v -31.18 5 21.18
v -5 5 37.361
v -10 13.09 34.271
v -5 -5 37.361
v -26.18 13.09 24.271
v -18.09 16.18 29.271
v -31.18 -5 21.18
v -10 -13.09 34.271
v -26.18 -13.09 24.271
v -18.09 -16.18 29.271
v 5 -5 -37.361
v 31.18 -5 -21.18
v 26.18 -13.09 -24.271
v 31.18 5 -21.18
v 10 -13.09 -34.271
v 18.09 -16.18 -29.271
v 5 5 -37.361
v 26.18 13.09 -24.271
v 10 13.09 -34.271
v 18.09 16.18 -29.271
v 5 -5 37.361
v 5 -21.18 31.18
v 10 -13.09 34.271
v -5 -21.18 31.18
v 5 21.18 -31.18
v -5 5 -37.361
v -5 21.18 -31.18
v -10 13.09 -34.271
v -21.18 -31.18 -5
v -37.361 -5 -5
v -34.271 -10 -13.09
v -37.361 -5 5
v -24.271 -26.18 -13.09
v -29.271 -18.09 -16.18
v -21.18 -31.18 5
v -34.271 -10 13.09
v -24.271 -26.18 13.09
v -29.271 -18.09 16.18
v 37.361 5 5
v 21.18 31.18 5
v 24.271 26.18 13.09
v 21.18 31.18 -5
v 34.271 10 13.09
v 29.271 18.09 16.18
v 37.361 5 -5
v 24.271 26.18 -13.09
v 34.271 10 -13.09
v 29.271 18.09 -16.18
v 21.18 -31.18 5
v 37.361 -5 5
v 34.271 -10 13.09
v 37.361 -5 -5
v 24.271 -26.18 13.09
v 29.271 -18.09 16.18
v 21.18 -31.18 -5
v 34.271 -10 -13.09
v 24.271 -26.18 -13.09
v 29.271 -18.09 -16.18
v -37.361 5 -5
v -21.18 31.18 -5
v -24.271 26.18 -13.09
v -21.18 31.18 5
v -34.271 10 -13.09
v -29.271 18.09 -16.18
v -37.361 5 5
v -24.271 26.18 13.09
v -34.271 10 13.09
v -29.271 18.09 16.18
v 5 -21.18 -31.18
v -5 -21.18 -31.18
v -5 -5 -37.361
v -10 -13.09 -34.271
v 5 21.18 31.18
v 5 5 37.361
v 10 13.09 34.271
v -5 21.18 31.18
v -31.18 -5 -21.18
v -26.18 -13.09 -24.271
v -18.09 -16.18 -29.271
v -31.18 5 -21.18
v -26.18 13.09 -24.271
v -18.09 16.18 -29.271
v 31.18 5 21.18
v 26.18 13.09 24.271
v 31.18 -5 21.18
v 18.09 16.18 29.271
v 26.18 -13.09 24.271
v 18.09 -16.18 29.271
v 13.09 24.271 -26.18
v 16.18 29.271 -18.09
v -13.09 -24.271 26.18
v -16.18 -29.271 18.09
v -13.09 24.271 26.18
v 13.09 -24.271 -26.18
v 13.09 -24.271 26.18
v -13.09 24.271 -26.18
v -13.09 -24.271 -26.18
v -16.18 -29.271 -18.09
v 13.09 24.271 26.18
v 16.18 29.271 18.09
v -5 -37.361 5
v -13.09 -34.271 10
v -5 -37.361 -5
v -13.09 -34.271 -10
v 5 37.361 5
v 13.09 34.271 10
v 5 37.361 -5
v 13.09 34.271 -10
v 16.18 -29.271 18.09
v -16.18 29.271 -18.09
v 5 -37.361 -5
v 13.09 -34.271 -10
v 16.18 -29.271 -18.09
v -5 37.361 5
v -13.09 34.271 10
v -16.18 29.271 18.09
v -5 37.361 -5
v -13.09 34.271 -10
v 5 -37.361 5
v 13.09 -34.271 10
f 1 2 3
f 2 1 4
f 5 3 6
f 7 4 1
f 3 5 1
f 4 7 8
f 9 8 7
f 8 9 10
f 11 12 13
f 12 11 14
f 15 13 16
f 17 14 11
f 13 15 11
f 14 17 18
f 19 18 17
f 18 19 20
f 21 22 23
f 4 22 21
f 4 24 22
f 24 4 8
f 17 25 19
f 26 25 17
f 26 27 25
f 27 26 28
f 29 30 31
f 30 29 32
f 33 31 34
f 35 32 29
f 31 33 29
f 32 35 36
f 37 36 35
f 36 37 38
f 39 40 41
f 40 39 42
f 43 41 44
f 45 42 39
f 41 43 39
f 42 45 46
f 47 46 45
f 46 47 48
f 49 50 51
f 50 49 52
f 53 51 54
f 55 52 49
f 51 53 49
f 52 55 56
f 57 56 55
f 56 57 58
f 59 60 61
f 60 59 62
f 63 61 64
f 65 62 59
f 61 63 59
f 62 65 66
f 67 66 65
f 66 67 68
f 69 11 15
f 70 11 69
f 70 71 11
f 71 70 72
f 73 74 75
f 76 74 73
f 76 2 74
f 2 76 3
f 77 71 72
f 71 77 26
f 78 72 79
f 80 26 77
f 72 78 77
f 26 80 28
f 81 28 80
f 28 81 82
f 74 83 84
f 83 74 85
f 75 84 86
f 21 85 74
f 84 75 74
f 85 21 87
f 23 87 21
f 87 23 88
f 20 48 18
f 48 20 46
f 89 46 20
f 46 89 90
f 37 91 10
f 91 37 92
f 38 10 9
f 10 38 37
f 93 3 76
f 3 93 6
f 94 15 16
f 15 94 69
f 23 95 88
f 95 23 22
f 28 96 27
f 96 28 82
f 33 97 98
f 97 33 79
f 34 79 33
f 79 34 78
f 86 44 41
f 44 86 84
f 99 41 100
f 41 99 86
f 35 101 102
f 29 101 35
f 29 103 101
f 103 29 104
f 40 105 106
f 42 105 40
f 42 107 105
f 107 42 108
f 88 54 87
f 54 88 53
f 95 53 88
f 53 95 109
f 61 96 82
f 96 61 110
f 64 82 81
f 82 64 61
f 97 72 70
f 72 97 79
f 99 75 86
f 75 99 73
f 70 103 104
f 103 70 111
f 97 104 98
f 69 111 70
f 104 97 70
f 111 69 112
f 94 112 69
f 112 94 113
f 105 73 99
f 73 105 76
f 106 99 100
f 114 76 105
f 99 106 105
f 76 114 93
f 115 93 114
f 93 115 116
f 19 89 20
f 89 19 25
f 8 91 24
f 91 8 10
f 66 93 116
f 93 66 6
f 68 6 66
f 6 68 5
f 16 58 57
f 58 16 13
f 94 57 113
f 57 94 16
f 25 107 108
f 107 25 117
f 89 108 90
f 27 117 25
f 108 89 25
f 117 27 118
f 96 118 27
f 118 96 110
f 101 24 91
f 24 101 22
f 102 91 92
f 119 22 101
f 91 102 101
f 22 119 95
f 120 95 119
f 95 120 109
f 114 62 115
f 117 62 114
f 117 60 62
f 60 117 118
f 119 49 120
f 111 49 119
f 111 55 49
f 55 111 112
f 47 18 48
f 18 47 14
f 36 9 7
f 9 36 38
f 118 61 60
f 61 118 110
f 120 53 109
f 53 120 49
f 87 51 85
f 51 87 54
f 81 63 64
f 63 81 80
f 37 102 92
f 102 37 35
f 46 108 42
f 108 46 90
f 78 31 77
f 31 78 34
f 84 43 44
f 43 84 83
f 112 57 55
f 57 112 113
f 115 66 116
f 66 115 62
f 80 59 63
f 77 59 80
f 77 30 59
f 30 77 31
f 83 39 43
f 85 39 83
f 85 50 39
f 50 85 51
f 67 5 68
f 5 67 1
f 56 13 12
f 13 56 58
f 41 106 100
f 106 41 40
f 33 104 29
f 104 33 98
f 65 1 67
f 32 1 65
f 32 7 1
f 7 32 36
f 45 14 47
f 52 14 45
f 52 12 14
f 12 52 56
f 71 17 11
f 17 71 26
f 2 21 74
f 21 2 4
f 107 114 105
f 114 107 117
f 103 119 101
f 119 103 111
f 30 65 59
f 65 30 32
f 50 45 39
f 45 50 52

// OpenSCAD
// test polyhedrons where the facets are not, stritcly speaking, planar,
// but instead "near planar". see issue #349 in github.
polyhedron(points = [[-10., -13.090169943749475, -34.270509831248425], 
[-10., -13.090169943749475, 34.270509831248425], 
[-10., 13.090169943749475, -34.270509831248425], 
[-10., 13.090169943749475, 34.270509831248425], 
[-5., -5., -37.3606797749979], [-5., -5., 37.3606797749979], 
[-5., 5., -37.3606797749979], [-5., 5., 37.3606797749979], 
[-5., -37.3606797749979, -5.], [-5., -37.3606797749979, 5.], 
[-5., -21.18033988749895, -31.18033988749895], 
[-5., -21.18033988749895, 31.18033988749895], [-5., 37.3606797749979, -5.], 
[-5., 37.3606797749979, 5.], [-5., 21.18033988749895, -31.18033988749895], 
[-5., 21.18033988749895, 31.18033988749895], [5., -5., -37.3606797749979], 
[5., -5., 37.3606797749979], [5., 5., -37.3606797749979], 
[5., 5., 37.3606797749979], [5., -37.3606797749979, -5.], 
[5., -37.3606797749979, 5.], [5., -21.18033988749895, -31.18033988749895], 
[5., -21.18033988749895, 31.18033988749895], [5., 37.3606797749979, -5.], 
[5., 37.3606797749979, 5.], [5., 21.18033988749895, -31.18033988749895], 
[5., 21.18033988749895, 31.18033988749895], [10., -13.090169943749475, 
 -34.270509831248425], [10., -13.090169943749475, 34.270509831248425], 
[10., 13.090169943749475, -34.270509831248425], 
[10., 13.090169943749475, 34.270509831248425], 
[-34.270509831248425, -10., -13.090169943749475], 
[-34.270509831248425, -10., 13.090169943749475], 
[-34.270509831248425, 10., -13.090169943749475], 
[-34.270509831248425, 10., 13.090169943749475], 
[-29.270509831248425, -18.090169943749473, -16.18033988749895], 
[-29.270509831248425, -18.090169943749473, 16.18033988749895], 
[-29.270509831248425, 18.090169943749473, -16.18033988749895], 
[-29.270509831248425, 18.090169943749473, 16.18033988749895], 
[-18.090169943749473, -16.18033988749895, -29.270509831248425], 
[-18.090169943749473, -16.18033988749895, 29.270509831248425], 
[-18.090169943749473, 16.18033988749895, -29.270509831248425], 
[-18.090169943749473, 16.18033988749895, 29.270509831248425], 
[-13.090169943749475, -34.270509831248425, -10.], 
[-13.090169943749475, -34.270509831248425, 10.], 
[-13.090169943749475, -24.270509831248425, -26.18033988749895], 
[-13.090169943749475, -24.270509831248425, 26.18033988749895], 
[-13.090169943749475, 24.270509831248425, -26.18033988749895], 
[-13.090169943749475, 24.270509831248425, 26.18033988749895], 
[-13.090169943749475, 34.270509831248425, -10.], 
[-13.090169943749475, 34.270509831248425, 10.], 
[-26.18033988749895, -13.090169943749475, -24.270509831248425], 
[-26.18033988749895, -13.090169943749475, 24.270509831248425], 
[-26.18033988749895, 13.090169943749475, -24.270509831248425], 
[-26.18033988749895, 13.090169943749475, 24.270509831248425], 
[-37.3606797749979, -5., -5.], [-37.3606797749979, -5., 5.], 
[-37.3606797749979, 5., -5.], [-37.3606797749979, 5., 5.], 
[-16.18033988749895, -29.270509831248425, -18.090169943749473], 
[-16.18033988749895, -29.270509831248425, 18.090169943749473], 
[-16.18033988749895, 29.270509831248425, -18.090169943749473], 
[-16.18033988749895, 29.270509831248425, 18.090169943749473], 
[-31.18033988749895, -5., -21.18033988749895], 
[-31.18033988749895, -5., 21.18033988749895], 
[-31.18033988749895, 5., -21.18033988749895], 
[-31.18033988749895, 5., 21.18033988749895], 
[-21.18033988749895, -31.18033988749895, -5.], 
[-21.18033988749895, -31.18033988749895, 5.], 
[-21.18033988749895, 31.18033988749895, -5.], 
[-21.18033988749895, 31.18033988749895, 5.], 
[-24.270509831248425, -26.18033988749895, -13.090169943749475], 
[-24.270509831248425, -26.18033988749895, 13.090169943749475], 
[-24.270509831248425, 26.18033988749895, -13.090169943749475], 
[-24.270509831248425, 26.18033988749895, 13.090169943749475], 
[16.18033988749895, -29.270509831248425, -18.090169943749473], 
[16.18033988749895, -29.270509831248425, 18.090169943749473], 
[16.18033988749895, 29.270509831248425, -18.090169943749473], 
[16.18033988749895, 29.270509831248425, 18.090169943749473], 
[24.270509831248425, -26.18033988749895, -13.090169943749475], 
[24.270509831248425, -26.18033988749895, 13.090169943749475], 
[24.270509831248425, 26.18033988749895, -13.090169943749475], 
[24.270509831248425, 26.18033988749895, 13.090169943749475], 
[37.3606797749979, -5., -5.], [37.3606797749979, -5., 5.], 
[37.3606797749979, 5., -5.], [37.3606797749979, 5., 5.], 
[21.18033988749895, -31.18033988749895, -5.], 
[21.18033988749895, -31.18033988749895, 5.], 
[21.18033988749895, 31.18033988749895, -5.], 
[21.18033988749895, 31.18033988749895, 5.], 
[13.090169943749475, -34.270509831248425, -10.], 
[13.090169943749475, -34.270509831248425, 10.], 
[13.090169943749475, -24.270509831248425, -26.18033988749895], 
[13.090169943749475, -24.270509831248425, 26.18033988749895], 
[13.090169943749475, 24.270509831248425, -26.18033988749895], 
[13.090169943749475, 24.270509831248425, 26.18033988749895], 
[13.090169943749475, 34.270509831248425, -10.], 
[13.090169943749475, 34.270509831248425, 10.], 
[26.18033988749895, -13.090169943749475, -24.270509831248425], 
[26.18033988749895, -13.090169943749475, 24.270509831248425], 
[26.18033988749895, 13.090169943749475, -24.270509831248425], 
[26.18033988749895, 13.090169943749475, 24.270509831248425], 
[31.18033988749895, -5., -21.18033988749895], 
[31.18033988749895, -5., 21.18033988749895], 
[31.18033988749895, 5., -21.18033988749895], 
[31.18033988749895, 5., 21.18033988749895], 
[18.090169943749473, -16.18033988749895, -29.270509831248425], 
[18.090169943749473, -16.18033988749895, 29.270509831248425], 
[18.090169943749473, 16.18033988749895, -29.270509831248425], 
[18.090169943749473, 16.18033988749895, 29.270509831248425], 
[29.270509831248425, -18.090169943749473, -16.18033988749895], 
[29.270509831248425, -18.090169943749473, 16.18033988749895], 
[29.270509831248425, 18.090169943749473, -16.18033988749895], 
[29.270509831248425, 18.090169943749473, 16.18033988749895], 
[34.270509831248425, -10., -13.090169943749475], 
[34.270509831248425, -10., 13.090169943749475], 
[34.270509831248425, 10., -13.090169943749475], 
[34.270509831248425, 10., 13.090169943749475]],faces = 
[[41, 53, 65, 67, 55, 43, 3, 7, 5, 1], [100, 104, 106, 102, 110, 30, 18, 16, 
 28, 108], [11, 1, 5, 17, 29, 23], [18, 30, 26, 14, 2, 6], 
[33, 37, 73, 69, 68, 72, 36, 32, 56, 57], [91, 90, 82, 114, 118, 86, 87, 
 119, 115, 83], [81, 113, 117, 85, 84, 116, 112, 80, 88, 89], 
[59, 58, 34, 38, 74, 70, 71, 75, 39, 35], [0, 10, 22, 28, 16, 4], 
[15, 27, 31, 19, 7, 3], [64, 52, 40, 0, 4, 6, 2, 42, 54, 66], 
[19, 31, 111, 103, 107, 105, 101, 109, 29, 17], [96, 110, 102, 114, 82, 78], 
[53, 41, 47, 61, 73, 37], [43, 49, 15, 3], [94, 108, 28, 22], 
[23, 29, 109, 95], [2, 14, 48, 42], [36, 72, 60, 46, 40, 52], 
[79, 83, 115, 103, 111, 97], [69, 45, 9, 8, 44, 68], 
[24, 98, 90, 91, 99, 25], [77, 95, 109, 101, 113, 81], 
[42, 48, 62, 74, 38, 54], [40, 46, 10, 0], [97, 111, 31, 27], 
[44, 8, 20, 92, 76, 94, 22, 10, 46, 60], [63, 51, 13, 25, 99, 79, 97, 27, 
 15, 49], [26, 30, 110, 96], [1, 11, 47, 41], [55, 39, 75, 63, 49, 43], 
[80, 112, 100, 108, 94, 76], [48, 14, 26, 96, 78, 98, 24, 12, 50, 62], 
[61, 47, 11, 23, 95, 77, 93, 21, 9, 45], [71, 70, 50, 12, 13, 51], 
[93, 89, 88, 92, 20, 21], [102, 106, 118, 114], [65, 53, 37, 33], 
[74, 62, 50, 70], [77, 81, 89, 93], [101, 105, 117, 113], [66, 54, 38, 34], 
[73, 61, 45, 69], [78, 82, 90, 98], [32, 36, 52, 64], [115, 119, 107, 103], 
[92, 88, 80, 76], [71, 51, 63, 75], [56, 32, 64, 66, 34, 58], 
[107, 119, 87, 85, 117, 105], [35, 39, 55, 67], [112, 116, 104, 100], 
[99, 91, 83, 79], [68, 44, 60, 72], [57, 59, 35, 67, 65, 33], 
[116, 84, 86, 118, 106, 104], [4, 16, 18, 6], [7, 19, 17, 5], 
[12, 24, 25, 13], [9, 21, 20, 8], [56, 58, 59, 57], [85, 87, 86, 84]]
);
